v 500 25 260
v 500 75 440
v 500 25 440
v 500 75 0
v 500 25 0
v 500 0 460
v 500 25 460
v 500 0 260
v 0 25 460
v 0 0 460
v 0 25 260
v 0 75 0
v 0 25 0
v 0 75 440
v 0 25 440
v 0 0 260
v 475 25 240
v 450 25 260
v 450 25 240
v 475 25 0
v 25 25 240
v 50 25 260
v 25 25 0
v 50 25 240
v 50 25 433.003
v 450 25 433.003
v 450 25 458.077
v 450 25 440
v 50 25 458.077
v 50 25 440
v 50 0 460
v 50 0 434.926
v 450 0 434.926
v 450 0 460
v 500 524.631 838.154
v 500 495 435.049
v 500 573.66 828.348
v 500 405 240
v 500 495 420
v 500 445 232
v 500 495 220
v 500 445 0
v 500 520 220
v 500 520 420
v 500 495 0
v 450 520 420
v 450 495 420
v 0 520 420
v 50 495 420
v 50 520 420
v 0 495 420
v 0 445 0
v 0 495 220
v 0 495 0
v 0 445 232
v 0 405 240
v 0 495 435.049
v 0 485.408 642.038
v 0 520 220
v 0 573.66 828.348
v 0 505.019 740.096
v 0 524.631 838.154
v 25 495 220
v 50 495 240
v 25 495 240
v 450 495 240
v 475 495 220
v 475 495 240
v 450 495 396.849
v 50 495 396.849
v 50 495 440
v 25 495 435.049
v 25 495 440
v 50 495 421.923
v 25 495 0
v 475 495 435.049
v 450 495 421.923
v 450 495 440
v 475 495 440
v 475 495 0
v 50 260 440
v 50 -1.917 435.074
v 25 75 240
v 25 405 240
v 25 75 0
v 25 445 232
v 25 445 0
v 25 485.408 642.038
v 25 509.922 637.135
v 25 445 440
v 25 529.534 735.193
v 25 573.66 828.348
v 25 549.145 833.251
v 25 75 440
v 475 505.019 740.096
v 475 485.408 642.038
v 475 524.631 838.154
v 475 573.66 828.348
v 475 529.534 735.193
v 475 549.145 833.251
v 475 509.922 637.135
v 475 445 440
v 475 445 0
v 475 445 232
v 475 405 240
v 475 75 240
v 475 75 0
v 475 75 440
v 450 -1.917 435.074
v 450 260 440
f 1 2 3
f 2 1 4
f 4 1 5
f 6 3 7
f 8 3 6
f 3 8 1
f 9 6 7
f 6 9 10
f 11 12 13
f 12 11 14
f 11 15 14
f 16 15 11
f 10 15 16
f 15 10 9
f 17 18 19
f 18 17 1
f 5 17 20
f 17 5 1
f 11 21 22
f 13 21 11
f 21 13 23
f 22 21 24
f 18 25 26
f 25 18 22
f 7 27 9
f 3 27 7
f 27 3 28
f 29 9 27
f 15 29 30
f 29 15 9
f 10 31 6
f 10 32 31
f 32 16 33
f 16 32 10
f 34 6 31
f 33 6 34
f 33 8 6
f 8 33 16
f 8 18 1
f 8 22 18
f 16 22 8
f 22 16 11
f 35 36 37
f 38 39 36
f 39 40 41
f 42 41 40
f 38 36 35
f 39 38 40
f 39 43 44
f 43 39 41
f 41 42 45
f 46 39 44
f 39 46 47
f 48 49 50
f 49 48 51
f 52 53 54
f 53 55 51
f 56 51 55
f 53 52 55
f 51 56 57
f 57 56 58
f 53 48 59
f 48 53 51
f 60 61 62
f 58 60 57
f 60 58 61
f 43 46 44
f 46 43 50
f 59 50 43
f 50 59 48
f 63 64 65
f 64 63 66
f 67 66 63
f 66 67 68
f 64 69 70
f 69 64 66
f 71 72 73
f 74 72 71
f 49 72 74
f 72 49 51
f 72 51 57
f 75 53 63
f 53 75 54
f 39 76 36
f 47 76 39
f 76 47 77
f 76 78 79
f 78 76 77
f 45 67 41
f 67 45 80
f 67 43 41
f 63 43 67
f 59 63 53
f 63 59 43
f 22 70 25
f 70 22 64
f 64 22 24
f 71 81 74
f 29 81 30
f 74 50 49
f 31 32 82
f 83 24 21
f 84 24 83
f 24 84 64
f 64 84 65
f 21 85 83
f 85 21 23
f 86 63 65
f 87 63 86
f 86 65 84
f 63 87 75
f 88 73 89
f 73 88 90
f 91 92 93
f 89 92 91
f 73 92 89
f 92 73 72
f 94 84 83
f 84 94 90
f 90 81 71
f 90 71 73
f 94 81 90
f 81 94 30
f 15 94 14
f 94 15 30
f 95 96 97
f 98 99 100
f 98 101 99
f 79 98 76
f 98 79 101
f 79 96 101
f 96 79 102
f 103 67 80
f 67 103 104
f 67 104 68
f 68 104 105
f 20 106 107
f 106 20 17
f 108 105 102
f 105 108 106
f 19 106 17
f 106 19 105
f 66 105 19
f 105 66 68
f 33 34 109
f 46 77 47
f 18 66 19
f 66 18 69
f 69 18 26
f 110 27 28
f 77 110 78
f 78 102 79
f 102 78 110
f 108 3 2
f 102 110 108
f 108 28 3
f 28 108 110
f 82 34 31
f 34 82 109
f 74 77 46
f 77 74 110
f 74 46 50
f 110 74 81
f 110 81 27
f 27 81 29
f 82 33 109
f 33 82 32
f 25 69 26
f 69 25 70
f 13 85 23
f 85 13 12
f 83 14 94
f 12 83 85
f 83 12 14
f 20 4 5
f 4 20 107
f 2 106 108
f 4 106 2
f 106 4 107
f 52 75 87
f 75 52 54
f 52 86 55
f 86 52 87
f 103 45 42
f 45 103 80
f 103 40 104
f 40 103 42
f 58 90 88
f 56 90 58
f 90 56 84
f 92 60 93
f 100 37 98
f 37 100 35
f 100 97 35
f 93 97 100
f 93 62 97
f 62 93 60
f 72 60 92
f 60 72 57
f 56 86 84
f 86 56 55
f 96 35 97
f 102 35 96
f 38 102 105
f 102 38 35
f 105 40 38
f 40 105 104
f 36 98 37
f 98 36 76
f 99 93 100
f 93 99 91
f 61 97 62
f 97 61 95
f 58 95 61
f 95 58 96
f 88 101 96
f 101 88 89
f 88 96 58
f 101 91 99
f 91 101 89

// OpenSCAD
// Archiyou -> OpenSCAD  |  script: sedia  |  units: mm
// OpenSCAD has no units: coordinates are in mm.
// Parts: 20 CSG, 0 baked, 0 2D
// Parameters at export, for reference only (nothing in this file is linked to them):
//   WIDTH_NUM_BOARDS = 4

$fn = 32;
PART = "";

// base front  (layer seat)
module base_front() {
    color([1, 0, 0]) translate([250, 12.5, 410]) cube([500, 25, 100], center = true);
}

// base front  (layer seat)
module base_front_2() {
    color([1, 0, 0]) translate([250, 12.5, 310]) cube([500, 25, 100], center = true);
}

// base back  (layer seat)
module base_back() {
    color([1, 0, 0]) translate([250, 507.5, 370]) cube([500, 25, 100], center = true);
}

// base back  (layer seat)
module base_back_2() {
    color([1, 0, 0]) translate([250, 507.5, 270]) cube([500, 25, 100], center = true);
}

// base left  (layer seat)
module base_left() {
    color([1, 0, 0]) translate([37.5, 260, 290]) cube([25, 470, 100], center = true);
}

// base left  (layer seat)
module base_left_2() {
    color([1, 0, 0]) translate([37.5, 260, 390]) cube([25, 470, 100], center = true);
}

// base right  (layer seat)
module base_right() {
    color([1, 0, 0]) multmatrix([[-1, 0, 0, 462.5], [0, 1, 0, 260], [0, 0, 1, 290], [0, 0, 0, 1]]) cube([25, 470, 100], center = true);
}

// base right  (layer seat)
module base_right_2() {
    color([1, 0, 0]) multmatrix([[-1, 0, 0, 462.5], [0, 1, 0, 260], [0, 0, 1, 390], [0, 0, 0, 1]]) cube([25, 470, 100], center = true);
}

// seat board  (layer seat)
module seat_board() {
    color([1, 0, 0]) multmatrix([[0, -1, 0, 50], [-0.997054485502, 0, -0.0766964988847, 520], [0.0766964988847, 0, -0.997054485502, 420], [0, 0, 0, 1]]) linear_extrude(height = 25) polygon([[0, 0], [521.536192416, 0], [521.536192416, -100], [0, -100]]);
}

// seat board  (layer seat)
module seat_board_2() {
    color([1, 0, 0]) multmatrix([[0, -1, 0, 150], [-0.997054485502, 0, -0.0766964988847, 520], [0.0766964988847, 0, -0.997054485502, 420], [0, 0, 0, 1]]) linear_extrude(height = 25) polygon([[0, 0], [521.536192416, 0], [521.536192416, -100], [0, -100]]);
}

// seat board  (layer seat)
module seat_board_3() {
    color([1, 0, 0]) multmatrix([[0, -1, 0, 250], [-0.997054485502, 0, -0.0766964988847, 520], [0.0766964988847, 0, -0.997054485502, 420], [0, 0, 0, 1]]) linear_extrude(height = 25) polygon([[0, 0], [521.536192416, 0], [521.536192416, -100], [0, -100]]);
}

// seat board  (layer seat)
module seat_board_4() {
    color([1, 0, 0]) multmatrix([[0, -1, 0, 350], [-0.997054485502, 0, -0.0766964988847, 520], [0.0766964988847, 0, -0.997054485502, 420], [0, 0, 0, 1]]) linear_extrude(height = 25) polygon([[0, 0], [521.536192416, 0], [521.536192416, -100], [0, -100]]);
}

// leg front left  (layer legs)
module leg_front_left() {
    color([0, 0, 1]) translate([12.5, 50, 220]) cube([25, 50, 440], center = true);
}

// leg front right  (layer legs)
module leg_front_right() {
    color([0, 0, 1]) translate([487.5, 50, 220]) cube([25, 50, 440], center = true);
}

// leg back left  (layer legs)
module leg_back_left() {
    color([0, 0, 1]) translate([12.5, 470, 220]) cube([25, 50, 440], center = true);
}

// leg back right  (layer legs)
module leg_back_right() {
    color([0, 0, 1]) translate([487.5, 470, 220]) cube([25, 50, 440], center = true);
}

// back rest diagonal  (layer back)
module back_rest_diagonal() {
    color([0, 0.502, 0]) multmatrix([[0, 1, 0, 25], [0.196116135138, 0, 0.980580675691, 405], [0.980580675691, 0, -0.196116135138, 240], [0, 0, 0, 1]]) linear_extrude(height = 50) polygon([[0, 0], [610, 0], [610, -25], [0, -25]]);
}

// back rest diagonal  (layer back)
module back_rest_diagonal_2() {
    color([0, 0.502, 0]) multmatrix([[0, -1, 0, 475], [0.196116135138, 0, 0.980580675691, 405], [0.980580675691, 0, -0.196116135138, 240], [0, 0, 0, 1]]) linear_extrude(height = 50) polygon([[0, 0], [610, 0], [610, -25], [0, -25]]);
}

// back rest plank  (layer back)
module back_rest_plank() {
    color([0, 0.502, 0]) multmatrix([[1, 0, 0, 0], [0, -0.196116135138, 0.980580675691, 524.630842434], [0, -0.980580675691, -0.196116135138, 838.154212171], [0, 0, 0, 1]]) linear_extrude(height = 25) polygon([[0, 0], [475, 0], [475, 100], [0, 100]]);
}

// back rest plank  (layer back)
module back_rest_plank_2() {
    color([0, 0.502, 0]) multmatrix([[1, 0, 0, 0], [0, -0.196116135138, 0.980580675691, 505.01922892], [0, -0.980580675691, -0.196116135138, 740.096144602], [0, 0, 0, 1]]) linear_extrude(height = 25) polygon([[0, 0], [475, 0], [475, 100], [0, 100]]);
}

// 3D parts
if (PART == "" || PART == "base_front") base_front();
if (PART == "" || PART == "base_front_2") base_front_2();
if (PART == "" || PART == "base_back") base_back();
if (PART == "" || PART == "base_back_2") base_back_2();
if (PART == "" || PART == "base_left") base_left();
if (PART == "" || PART == "base_left_2") base_left_2();
if (PART == "" || PART == "base_right") base_right();
if (PART == "" || PART == "base_right_2") base_right_2();
if (PART == "" || PART == "seat_board") seat_board();
if (PART == "" || PART == "seat_board_2") seat_board_2();
if (PART == "" || PART == "seat_board_3") seat_board_3();
if (PART == "" || PART == "seat_board_4") seat_board_4();
if (PART == "" || PART == "leg_front_left") leg_front_left();
if (PART == "" || PART == "leg_front_right") leg_front_right();
if (PART == "" || PART == "leg_back_left") leg_back_left();
if (PART == "" || PART == "leg_back_right") leg_back_right();
if (PART == "" || PART == "back_rest_diagonal") back_rest_diagonal();
if (PART == "" || PART == "back_rest_diagonal_2") back_rest_diagonal_2();
if (PART == "" || PART == "back_rest_plank") back_rest_plank();
if (PART == "" || PART == "back_rest_plank_2") back_rest_plank_2();
